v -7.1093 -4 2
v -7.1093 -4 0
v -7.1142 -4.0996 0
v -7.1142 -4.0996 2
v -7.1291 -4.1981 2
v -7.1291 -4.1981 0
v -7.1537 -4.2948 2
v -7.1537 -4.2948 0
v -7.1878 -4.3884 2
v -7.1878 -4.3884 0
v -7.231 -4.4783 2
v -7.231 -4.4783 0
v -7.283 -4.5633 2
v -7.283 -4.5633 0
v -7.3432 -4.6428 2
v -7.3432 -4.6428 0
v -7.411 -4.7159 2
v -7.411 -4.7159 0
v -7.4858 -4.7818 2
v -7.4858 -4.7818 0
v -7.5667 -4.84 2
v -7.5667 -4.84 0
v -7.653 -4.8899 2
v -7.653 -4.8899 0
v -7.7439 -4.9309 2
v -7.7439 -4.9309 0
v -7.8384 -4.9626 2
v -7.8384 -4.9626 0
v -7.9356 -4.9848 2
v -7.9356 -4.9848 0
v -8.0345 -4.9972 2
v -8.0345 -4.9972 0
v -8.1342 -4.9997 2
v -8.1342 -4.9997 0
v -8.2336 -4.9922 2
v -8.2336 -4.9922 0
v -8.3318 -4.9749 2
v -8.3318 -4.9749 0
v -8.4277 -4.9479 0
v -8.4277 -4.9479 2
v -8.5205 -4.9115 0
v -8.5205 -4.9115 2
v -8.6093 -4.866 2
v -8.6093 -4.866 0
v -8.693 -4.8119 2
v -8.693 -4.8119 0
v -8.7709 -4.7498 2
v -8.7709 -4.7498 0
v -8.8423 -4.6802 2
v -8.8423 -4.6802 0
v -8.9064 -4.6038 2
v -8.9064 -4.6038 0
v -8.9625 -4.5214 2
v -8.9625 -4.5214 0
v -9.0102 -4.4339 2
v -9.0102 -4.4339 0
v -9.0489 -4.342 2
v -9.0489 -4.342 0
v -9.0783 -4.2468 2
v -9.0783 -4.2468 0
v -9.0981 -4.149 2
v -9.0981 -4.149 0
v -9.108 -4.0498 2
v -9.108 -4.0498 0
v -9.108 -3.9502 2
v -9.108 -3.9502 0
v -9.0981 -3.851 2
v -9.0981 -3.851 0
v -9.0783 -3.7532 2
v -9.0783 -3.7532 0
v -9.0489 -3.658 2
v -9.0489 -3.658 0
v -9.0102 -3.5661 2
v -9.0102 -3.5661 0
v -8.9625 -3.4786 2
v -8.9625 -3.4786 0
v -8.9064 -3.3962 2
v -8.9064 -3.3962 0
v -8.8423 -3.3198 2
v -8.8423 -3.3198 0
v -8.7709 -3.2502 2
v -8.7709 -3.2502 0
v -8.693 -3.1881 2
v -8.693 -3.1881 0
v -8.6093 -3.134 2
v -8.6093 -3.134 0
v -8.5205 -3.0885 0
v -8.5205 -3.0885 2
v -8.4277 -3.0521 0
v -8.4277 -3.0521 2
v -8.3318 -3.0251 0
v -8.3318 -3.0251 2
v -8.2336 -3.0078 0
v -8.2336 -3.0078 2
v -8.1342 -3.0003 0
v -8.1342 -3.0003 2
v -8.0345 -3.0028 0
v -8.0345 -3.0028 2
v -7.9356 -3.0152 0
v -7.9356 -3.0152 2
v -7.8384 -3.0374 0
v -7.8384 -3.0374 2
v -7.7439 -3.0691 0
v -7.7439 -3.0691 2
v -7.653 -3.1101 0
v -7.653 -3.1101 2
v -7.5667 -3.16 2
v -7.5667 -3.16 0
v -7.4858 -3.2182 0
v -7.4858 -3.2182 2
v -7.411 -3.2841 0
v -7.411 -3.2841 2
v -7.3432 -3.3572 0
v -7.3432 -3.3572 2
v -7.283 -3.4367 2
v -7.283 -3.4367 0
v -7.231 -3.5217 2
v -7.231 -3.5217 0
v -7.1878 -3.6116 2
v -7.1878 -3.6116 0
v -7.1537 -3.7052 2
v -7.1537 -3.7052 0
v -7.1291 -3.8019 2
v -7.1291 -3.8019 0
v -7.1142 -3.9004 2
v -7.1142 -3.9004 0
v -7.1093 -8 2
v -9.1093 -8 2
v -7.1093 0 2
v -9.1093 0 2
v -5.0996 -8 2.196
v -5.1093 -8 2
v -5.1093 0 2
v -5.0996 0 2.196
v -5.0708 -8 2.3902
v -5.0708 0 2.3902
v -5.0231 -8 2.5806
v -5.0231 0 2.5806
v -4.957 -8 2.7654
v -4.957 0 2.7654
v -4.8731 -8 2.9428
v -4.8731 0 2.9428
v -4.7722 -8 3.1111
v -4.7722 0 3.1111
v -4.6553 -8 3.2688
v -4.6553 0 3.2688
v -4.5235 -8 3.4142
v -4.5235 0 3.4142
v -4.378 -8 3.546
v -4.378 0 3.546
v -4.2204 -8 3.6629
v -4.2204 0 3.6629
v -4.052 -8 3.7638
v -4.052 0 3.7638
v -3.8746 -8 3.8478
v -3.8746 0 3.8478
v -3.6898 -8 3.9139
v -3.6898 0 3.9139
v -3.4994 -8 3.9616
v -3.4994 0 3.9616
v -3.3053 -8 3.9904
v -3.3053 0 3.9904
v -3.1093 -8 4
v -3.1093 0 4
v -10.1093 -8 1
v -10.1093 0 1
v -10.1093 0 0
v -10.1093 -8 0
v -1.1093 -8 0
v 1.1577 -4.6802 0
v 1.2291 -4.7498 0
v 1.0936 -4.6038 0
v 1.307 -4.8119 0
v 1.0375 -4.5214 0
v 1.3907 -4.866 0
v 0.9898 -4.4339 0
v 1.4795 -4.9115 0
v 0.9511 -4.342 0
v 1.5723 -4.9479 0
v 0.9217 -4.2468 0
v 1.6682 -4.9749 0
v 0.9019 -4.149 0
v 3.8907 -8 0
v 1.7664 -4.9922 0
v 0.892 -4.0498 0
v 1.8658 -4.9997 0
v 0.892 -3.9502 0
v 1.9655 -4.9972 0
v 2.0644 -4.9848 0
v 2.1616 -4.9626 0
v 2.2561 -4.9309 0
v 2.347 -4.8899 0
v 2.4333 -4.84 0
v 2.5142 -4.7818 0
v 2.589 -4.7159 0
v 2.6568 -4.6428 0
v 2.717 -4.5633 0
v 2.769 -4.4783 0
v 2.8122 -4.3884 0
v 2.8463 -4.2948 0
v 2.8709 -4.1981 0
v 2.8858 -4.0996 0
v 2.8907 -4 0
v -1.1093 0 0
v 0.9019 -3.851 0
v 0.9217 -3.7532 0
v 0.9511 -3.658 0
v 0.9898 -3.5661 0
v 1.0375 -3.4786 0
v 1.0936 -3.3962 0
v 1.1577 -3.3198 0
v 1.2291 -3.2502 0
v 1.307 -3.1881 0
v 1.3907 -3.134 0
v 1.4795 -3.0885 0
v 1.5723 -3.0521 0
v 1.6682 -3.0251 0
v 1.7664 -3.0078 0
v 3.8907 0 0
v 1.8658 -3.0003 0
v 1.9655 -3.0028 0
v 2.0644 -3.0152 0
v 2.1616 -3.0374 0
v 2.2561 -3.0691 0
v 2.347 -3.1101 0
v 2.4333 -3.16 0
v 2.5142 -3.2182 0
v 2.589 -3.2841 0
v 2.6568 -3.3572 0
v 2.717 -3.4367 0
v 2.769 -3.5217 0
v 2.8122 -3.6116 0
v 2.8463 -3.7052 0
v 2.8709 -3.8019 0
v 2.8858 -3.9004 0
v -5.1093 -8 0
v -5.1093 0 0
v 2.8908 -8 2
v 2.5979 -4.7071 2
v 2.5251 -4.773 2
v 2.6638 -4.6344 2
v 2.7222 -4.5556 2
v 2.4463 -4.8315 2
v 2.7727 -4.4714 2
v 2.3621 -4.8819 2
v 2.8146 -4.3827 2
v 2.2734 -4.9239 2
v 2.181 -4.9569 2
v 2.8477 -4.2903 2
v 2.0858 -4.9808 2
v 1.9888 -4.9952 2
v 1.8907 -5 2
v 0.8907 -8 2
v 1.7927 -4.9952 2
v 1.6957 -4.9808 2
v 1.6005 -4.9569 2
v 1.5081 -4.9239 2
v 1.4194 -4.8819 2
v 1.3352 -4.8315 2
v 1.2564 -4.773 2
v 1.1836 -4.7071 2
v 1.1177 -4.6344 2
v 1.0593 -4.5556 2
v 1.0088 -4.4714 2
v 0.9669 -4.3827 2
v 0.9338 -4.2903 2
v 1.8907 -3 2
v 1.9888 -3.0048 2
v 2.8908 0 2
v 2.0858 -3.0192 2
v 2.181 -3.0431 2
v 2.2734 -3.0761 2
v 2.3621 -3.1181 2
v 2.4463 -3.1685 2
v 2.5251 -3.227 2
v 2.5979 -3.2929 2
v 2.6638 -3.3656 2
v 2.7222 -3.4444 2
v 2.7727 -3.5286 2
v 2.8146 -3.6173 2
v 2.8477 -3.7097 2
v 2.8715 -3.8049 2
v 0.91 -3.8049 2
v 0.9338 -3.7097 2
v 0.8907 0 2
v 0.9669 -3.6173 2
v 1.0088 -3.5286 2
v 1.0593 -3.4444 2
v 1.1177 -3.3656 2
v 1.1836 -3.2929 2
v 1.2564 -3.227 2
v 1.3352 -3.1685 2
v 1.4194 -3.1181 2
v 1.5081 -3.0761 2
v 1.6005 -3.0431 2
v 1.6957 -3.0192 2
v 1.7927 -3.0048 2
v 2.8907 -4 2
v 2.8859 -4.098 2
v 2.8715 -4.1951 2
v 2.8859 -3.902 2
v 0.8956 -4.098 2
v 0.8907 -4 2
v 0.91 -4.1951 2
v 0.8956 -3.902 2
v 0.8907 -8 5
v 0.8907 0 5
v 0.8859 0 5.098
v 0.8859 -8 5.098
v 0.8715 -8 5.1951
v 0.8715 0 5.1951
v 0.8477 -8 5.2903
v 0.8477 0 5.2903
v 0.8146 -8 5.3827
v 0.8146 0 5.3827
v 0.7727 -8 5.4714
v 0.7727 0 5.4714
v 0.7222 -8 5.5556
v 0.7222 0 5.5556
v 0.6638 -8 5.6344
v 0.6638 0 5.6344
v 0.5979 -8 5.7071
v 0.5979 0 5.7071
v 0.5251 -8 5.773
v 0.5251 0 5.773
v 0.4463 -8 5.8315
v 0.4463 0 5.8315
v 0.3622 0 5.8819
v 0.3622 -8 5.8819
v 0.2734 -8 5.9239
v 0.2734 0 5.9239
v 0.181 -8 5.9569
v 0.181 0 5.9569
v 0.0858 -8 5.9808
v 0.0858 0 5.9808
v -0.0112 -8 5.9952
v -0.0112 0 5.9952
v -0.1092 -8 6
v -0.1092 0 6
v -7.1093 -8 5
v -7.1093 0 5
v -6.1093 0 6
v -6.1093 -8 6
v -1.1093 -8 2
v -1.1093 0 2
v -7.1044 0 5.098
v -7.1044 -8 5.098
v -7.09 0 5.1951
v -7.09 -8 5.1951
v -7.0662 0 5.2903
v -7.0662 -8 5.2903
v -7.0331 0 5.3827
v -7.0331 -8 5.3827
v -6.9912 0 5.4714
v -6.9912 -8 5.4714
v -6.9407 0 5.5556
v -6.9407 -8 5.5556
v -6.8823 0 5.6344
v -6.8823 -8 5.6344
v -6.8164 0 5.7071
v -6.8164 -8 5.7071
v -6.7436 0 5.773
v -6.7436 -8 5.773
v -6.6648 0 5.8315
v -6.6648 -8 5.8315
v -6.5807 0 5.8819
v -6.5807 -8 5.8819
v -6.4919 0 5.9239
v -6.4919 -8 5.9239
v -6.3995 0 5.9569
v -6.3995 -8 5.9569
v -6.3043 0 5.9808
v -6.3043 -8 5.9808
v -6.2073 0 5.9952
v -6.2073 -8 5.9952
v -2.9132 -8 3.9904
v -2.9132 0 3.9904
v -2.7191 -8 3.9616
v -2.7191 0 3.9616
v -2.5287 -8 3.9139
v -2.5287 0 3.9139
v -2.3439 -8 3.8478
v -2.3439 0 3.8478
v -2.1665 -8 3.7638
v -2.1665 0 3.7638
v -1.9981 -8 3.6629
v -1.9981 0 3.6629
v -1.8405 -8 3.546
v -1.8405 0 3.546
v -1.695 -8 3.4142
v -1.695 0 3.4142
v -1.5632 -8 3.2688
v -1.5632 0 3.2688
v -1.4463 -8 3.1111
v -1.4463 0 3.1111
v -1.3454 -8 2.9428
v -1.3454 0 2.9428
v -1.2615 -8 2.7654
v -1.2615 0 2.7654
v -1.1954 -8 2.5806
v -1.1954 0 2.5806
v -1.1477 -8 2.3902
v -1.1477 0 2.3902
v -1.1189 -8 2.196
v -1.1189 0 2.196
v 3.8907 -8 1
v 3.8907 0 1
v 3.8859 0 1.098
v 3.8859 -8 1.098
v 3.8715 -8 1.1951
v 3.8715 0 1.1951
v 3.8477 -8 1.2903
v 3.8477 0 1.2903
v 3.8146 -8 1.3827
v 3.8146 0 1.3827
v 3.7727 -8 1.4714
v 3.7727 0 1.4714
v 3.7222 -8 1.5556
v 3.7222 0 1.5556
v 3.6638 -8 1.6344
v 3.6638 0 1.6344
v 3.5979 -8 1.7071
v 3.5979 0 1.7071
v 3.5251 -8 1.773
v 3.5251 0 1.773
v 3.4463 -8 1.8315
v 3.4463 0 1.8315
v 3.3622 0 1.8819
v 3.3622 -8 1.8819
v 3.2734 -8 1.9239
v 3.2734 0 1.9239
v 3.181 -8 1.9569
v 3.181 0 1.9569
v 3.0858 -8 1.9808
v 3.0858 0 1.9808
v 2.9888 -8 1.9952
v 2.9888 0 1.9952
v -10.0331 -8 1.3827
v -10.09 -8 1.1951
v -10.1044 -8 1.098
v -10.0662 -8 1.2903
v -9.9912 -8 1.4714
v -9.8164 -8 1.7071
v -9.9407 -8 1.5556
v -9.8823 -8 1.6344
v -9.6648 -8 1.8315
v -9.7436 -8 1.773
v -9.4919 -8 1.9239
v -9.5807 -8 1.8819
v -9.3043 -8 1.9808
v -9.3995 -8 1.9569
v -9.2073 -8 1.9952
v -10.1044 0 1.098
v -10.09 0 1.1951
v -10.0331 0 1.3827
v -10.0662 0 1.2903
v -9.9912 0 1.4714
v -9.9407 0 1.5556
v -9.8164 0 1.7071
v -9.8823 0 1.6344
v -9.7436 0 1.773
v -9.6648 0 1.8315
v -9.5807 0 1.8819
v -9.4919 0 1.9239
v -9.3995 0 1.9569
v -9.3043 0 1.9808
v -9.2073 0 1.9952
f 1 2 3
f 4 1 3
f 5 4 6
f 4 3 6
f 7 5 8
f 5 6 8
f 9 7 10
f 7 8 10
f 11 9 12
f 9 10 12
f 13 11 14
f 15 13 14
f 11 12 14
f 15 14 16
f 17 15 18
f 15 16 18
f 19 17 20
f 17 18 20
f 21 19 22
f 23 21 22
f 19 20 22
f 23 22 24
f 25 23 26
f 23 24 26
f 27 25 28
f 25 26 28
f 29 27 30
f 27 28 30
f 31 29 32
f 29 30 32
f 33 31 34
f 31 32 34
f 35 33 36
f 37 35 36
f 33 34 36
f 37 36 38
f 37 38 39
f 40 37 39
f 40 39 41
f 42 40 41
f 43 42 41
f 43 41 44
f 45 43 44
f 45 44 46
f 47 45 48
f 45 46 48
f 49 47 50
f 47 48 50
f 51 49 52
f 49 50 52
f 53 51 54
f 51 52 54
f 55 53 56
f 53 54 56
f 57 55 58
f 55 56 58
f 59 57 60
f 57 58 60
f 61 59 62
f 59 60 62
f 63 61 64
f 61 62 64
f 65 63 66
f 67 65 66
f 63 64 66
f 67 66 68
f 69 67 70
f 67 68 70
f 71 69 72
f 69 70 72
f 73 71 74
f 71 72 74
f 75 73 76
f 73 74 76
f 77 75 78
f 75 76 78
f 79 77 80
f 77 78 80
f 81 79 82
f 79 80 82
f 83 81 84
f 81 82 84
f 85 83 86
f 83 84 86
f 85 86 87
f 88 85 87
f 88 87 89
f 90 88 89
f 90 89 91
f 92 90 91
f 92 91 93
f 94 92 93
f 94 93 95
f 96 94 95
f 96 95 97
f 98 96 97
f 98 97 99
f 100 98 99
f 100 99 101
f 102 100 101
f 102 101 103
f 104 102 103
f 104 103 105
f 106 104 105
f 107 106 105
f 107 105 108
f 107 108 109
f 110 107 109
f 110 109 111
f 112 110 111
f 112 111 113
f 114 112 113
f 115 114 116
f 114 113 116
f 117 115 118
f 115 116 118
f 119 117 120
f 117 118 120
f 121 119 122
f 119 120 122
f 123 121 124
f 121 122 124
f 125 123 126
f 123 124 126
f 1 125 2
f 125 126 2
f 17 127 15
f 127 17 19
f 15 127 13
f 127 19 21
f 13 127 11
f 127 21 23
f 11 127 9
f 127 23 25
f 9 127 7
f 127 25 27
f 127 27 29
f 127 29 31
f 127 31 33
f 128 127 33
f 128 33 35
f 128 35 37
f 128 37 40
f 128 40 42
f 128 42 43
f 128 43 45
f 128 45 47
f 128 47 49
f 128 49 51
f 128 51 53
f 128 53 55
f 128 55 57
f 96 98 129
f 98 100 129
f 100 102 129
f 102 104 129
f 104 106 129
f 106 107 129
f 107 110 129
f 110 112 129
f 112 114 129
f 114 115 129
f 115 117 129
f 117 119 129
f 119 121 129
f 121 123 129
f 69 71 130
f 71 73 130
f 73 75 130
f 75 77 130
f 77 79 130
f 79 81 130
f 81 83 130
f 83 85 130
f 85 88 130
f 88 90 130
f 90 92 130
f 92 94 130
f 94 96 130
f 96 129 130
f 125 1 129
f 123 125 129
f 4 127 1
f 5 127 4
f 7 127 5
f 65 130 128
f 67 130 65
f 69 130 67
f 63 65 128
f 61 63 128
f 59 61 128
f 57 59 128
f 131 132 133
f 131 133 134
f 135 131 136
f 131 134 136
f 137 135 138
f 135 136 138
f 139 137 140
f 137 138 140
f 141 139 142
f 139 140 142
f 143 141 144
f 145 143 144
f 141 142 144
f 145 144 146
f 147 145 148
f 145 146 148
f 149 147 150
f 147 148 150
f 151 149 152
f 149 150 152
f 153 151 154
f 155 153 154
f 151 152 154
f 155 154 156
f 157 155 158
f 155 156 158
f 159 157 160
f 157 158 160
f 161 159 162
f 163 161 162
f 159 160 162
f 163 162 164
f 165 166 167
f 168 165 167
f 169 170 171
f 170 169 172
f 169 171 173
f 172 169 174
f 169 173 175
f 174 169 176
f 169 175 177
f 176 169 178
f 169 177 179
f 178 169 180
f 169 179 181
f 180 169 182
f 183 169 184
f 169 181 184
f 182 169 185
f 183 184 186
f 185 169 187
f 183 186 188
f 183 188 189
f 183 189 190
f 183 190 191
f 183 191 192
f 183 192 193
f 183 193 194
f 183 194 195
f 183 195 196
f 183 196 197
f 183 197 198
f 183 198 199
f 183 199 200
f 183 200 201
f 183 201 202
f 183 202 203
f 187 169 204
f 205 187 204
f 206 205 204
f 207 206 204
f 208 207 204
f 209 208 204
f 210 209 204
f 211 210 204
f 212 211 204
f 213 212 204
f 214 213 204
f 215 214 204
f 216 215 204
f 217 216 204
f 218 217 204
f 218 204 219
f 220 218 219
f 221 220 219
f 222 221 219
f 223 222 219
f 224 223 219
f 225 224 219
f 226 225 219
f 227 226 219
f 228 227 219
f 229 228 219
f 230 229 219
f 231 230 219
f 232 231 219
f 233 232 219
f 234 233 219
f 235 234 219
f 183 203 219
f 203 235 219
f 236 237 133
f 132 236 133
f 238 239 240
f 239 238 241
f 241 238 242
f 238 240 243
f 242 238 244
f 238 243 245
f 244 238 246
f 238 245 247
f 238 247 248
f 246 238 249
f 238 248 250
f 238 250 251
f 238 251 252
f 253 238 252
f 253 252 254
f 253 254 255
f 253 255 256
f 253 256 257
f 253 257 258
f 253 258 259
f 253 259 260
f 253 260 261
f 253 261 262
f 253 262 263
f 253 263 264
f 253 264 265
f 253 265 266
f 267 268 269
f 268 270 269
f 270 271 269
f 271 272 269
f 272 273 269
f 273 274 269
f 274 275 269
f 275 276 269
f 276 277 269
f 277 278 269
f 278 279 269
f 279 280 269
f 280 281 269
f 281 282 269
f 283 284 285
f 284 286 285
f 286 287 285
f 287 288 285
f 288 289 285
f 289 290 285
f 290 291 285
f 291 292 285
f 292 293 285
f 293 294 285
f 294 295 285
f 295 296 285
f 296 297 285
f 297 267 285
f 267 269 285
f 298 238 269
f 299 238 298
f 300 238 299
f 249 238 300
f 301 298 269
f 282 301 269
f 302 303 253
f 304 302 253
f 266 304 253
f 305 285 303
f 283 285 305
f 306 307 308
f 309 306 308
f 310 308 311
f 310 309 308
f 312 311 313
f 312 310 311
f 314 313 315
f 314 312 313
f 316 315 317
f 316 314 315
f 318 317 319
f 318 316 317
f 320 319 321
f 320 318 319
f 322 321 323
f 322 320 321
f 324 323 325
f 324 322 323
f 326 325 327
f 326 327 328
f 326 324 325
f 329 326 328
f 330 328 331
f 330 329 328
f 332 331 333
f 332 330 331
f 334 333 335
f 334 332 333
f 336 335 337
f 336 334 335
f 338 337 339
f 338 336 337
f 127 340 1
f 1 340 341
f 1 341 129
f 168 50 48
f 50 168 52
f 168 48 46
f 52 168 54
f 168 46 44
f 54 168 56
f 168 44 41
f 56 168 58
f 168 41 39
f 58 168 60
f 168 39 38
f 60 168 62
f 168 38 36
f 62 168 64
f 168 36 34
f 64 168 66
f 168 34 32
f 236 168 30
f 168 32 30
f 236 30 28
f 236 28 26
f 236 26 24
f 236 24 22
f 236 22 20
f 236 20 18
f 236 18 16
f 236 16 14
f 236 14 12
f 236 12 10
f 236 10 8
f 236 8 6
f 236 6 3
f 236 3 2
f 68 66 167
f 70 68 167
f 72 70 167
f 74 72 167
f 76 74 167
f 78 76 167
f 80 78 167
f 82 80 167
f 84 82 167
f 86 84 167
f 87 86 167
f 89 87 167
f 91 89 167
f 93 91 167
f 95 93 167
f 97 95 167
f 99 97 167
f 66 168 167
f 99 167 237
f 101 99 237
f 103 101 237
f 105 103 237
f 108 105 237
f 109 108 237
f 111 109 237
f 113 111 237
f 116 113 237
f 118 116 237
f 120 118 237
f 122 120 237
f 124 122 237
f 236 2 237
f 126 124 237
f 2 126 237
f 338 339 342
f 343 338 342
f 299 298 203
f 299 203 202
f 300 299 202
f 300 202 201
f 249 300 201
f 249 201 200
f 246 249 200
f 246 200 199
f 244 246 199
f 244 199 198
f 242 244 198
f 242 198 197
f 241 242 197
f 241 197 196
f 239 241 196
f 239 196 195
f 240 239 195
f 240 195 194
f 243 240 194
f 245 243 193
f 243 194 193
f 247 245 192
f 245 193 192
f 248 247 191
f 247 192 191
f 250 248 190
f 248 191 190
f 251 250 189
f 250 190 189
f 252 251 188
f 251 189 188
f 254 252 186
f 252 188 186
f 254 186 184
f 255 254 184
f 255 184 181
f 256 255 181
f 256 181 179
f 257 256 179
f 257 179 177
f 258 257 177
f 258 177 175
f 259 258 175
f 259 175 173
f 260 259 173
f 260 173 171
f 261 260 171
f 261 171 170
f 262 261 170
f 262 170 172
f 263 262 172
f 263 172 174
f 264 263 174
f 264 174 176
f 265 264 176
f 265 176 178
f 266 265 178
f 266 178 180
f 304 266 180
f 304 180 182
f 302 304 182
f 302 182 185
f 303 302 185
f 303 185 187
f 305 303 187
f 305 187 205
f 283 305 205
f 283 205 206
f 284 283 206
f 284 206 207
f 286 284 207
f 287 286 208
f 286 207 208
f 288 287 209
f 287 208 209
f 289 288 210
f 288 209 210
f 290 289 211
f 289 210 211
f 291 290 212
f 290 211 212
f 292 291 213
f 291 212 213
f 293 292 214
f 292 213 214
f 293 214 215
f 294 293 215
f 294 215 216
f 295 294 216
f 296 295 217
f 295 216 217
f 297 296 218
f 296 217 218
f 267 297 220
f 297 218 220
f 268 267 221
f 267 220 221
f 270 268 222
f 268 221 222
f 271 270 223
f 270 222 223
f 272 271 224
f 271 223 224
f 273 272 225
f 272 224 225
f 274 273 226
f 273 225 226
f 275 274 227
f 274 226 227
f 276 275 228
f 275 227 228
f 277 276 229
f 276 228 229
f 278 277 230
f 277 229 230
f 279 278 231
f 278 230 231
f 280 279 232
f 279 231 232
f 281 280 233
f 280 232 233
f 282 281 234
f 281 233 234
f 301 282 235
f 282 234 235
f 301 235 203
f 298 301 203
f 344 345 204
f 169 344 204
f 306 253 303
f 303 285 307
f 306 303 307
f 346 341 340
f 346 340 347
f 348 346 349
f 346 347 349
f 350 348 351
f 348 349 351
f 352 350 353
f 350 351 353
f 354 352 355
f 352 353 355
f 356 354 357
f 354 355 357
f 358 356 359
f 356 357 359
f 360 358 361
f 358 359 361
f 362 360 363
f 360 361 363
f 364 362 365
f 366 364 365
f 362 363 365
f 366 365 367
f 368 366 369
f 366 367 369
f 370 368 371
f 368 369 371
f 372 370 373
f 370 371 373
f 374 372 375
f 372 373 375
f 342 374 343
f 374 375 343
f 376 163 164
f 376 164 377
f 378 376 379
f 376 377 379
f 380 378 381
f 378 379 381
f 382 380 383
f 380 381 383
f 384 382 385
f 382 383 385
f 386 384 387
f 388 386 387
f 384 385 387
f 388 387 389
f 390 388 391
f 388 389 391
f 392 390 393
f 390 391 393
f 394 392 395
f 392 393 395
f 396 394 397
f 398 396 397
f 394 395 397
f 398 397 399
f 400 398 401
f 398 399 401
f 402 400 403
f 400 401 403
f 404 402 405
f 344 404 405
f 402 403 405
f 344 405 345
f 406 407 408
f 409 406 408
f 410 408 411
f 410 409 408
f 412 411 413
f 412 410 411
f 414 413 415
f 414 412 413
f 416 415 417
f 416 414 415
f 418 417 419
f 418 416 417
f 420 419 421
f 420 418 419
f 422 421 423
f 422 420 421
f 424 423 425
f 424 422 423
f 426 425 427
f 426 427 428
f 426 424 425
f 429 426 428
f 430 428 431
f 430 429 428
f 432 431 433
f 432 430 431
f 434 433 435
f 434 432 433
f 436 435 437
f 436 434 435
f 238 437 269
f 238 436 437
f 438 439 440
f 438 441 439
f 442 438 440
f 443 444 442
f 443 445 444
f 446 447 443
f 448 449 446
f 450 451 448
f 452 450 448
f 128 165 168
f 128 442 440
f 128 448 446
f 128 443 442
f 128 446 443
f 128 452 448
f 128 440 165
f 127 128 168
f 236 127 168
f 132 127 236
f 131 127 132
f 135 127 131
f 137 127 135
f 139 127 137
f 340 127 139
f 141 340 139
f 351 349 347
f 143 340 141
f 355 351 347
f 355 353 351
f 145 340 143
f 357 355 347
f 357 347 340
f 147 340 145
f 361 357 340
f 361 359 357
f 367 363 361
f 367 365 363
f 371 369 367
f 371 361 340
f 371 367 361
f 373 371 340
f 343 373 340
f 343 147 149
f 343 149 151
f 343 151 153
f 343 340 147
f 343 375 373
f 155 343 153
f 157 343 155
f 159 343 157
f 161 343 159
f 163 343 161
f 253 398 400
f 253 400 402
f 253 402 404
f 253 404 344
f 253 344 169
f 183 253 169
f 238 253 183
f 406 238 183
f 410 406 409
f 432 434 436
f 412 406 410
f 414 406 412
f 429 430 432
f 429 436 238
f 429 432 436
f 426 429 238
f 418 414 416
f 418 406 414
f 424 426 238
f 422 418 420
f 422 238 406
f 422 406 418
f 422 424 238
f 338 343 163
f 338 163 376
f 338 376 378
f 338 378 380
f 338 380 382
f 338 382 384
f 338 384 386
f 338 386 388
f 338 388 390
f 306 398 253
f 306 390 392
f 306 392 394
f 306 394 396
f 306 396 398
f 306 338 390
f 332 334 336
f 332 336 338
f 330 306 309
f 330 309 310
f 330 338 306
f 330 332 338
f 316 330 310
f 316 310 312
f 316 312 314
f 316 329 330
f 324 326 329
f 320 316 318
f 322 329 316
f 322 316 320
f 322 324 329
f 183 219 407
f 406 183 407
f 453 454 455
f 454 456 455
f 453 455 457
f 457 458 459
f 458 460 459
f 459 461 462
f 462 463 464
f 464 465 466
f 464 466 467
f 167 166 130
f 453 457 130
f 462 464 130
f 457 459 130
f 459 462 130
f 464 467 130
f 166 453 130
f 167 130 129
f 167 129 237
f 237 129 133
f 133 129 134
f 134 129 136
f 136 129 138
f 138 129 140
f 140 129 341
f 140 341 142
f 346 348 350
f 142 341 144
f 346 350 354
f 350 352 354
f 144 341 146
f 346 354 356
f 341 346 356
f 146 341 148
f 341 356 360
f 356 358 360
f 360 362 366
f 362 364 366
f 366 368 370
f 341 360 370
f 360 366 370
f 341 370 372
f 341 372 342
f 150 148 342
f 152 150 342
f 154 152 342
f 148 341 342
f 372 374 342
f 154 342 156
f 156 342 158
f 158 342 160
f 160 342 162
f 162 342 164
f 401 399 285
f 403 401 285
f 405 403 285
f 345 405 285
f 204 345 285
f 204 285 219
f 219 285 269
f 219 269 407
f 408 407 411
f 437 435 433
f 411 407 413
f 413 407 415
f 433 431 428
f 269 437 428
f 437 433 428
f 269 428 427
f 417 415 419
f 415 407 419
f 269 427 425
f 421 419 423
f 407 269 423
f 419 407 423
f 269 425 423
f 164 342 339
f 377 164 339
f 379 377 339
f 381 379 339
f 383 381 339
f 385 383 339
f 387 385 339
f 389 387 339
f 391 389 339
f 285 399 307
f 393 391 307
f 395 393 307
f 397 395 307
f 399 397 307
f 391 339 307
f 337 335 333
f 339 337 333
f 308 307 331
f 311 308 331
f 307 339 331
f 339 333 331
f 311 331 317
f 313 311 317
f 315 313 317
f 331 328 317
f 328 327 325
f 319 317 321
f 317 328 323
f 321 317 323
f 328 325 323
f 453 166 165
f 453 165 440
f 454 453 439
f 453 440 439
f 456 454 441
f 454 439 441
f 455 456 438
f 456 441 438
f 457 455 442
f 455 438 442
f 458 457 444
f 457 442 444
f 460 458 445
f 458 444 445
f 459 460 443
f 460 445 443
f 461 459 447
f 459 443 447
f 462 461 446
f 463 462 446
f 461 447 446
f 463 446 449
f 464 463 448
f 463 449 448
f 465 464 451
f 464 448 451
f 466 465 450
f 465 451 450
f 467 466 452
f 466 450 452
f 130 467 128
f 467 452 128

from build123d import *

# Parameters (mm, degrees)
F1_DEPTH = 8
F2_R     = 1
F3_DEPTH = 2
F4_R     = 1
F5_DEPTH = 2
F6_R     = 0.99999


# Not quite as in the source:
# - a fillet or chamfer is up to 0.001 mm smaller than in the source, because OpenCascade refuses the exact size


with BuildPart() as f1:
    # F0 (on Front) → F1 (new body)
    with BuildSketch(Plane.XZ):
        with BuildLine():
            Line((-10.1092506963, 2), (-10.1092506963, 0))
            Line((-10.1092506963, 0), (-5.1092506963, 0))
            Line((-5.1092506963, 0), (-5.1092506963, 2))
            ThreePointArc((-5.1092506963, 2), (-4.5234642587, 3.4142135624), (-3.1092506963, 4))
            ThreePointArc((-3.1092506963, 4), (-1.6950371339, 3.4142135624), (-1.1092506963, 2))
            Line((-1.1092506963, 2), (-1.1092506963, 0))
            Line((-1.1092506963, 0), (3.8907493037, 0))
            Line((3.8907493037, 0), (3.8907493037, 2))
            Line((3.8907493037, 2), (0.8907493037, 2))
            Line((0.8907493037, 2), (0.8907493037, 6))
            Line((0.8907493037, 6), (-7.1092506963, 6))
            Line((-7.1092506963, 6), (-7.1092506963, 2))
            Line((-7.1092506963, 2), (-10.1092506963, 2))
        make_face()
    extrude(amount=F1_DEPTH)

    # F2 (on face) → F3 (cut)
    with BuildSketch(Plane(origin=(0, 0, 0), x_dir=(1, 0, 0), z_dir=(0, 0, -1))):
        with Locations((-8.1092506963, 4)):
            Circle(F2_R)
    extrude(amount=-F3_DEPTH, mode=Mode.SUBTRACT)

    # F4 (on face) → F5 (cut)
    with BuildSketch(Plane(origin=(0, 0, 0), x_dir=(1, 0, 0), z_dir=(0, 0, -1))):
        with Locations((1.8907493037, 4)):
            Circle(F4_R)
    extrude(amount=-F5_DEPTH, mode=Mode.SUBTRACT)

    # F6 (radius 1 in the source; OpenCascade refuses exactly that, so slightly less here)
    f6_edges = [f1.edges().sort_by_distance(p)[0] for p in [
        (-10.109251, -4, 2),
        (-7.109251, -4, 6),
        (0.890749, -4, 6),
        (3.890749, -4, 2),
    ]]
    fillet(f6_edges, radius=F6_R)


solid = f1.part
